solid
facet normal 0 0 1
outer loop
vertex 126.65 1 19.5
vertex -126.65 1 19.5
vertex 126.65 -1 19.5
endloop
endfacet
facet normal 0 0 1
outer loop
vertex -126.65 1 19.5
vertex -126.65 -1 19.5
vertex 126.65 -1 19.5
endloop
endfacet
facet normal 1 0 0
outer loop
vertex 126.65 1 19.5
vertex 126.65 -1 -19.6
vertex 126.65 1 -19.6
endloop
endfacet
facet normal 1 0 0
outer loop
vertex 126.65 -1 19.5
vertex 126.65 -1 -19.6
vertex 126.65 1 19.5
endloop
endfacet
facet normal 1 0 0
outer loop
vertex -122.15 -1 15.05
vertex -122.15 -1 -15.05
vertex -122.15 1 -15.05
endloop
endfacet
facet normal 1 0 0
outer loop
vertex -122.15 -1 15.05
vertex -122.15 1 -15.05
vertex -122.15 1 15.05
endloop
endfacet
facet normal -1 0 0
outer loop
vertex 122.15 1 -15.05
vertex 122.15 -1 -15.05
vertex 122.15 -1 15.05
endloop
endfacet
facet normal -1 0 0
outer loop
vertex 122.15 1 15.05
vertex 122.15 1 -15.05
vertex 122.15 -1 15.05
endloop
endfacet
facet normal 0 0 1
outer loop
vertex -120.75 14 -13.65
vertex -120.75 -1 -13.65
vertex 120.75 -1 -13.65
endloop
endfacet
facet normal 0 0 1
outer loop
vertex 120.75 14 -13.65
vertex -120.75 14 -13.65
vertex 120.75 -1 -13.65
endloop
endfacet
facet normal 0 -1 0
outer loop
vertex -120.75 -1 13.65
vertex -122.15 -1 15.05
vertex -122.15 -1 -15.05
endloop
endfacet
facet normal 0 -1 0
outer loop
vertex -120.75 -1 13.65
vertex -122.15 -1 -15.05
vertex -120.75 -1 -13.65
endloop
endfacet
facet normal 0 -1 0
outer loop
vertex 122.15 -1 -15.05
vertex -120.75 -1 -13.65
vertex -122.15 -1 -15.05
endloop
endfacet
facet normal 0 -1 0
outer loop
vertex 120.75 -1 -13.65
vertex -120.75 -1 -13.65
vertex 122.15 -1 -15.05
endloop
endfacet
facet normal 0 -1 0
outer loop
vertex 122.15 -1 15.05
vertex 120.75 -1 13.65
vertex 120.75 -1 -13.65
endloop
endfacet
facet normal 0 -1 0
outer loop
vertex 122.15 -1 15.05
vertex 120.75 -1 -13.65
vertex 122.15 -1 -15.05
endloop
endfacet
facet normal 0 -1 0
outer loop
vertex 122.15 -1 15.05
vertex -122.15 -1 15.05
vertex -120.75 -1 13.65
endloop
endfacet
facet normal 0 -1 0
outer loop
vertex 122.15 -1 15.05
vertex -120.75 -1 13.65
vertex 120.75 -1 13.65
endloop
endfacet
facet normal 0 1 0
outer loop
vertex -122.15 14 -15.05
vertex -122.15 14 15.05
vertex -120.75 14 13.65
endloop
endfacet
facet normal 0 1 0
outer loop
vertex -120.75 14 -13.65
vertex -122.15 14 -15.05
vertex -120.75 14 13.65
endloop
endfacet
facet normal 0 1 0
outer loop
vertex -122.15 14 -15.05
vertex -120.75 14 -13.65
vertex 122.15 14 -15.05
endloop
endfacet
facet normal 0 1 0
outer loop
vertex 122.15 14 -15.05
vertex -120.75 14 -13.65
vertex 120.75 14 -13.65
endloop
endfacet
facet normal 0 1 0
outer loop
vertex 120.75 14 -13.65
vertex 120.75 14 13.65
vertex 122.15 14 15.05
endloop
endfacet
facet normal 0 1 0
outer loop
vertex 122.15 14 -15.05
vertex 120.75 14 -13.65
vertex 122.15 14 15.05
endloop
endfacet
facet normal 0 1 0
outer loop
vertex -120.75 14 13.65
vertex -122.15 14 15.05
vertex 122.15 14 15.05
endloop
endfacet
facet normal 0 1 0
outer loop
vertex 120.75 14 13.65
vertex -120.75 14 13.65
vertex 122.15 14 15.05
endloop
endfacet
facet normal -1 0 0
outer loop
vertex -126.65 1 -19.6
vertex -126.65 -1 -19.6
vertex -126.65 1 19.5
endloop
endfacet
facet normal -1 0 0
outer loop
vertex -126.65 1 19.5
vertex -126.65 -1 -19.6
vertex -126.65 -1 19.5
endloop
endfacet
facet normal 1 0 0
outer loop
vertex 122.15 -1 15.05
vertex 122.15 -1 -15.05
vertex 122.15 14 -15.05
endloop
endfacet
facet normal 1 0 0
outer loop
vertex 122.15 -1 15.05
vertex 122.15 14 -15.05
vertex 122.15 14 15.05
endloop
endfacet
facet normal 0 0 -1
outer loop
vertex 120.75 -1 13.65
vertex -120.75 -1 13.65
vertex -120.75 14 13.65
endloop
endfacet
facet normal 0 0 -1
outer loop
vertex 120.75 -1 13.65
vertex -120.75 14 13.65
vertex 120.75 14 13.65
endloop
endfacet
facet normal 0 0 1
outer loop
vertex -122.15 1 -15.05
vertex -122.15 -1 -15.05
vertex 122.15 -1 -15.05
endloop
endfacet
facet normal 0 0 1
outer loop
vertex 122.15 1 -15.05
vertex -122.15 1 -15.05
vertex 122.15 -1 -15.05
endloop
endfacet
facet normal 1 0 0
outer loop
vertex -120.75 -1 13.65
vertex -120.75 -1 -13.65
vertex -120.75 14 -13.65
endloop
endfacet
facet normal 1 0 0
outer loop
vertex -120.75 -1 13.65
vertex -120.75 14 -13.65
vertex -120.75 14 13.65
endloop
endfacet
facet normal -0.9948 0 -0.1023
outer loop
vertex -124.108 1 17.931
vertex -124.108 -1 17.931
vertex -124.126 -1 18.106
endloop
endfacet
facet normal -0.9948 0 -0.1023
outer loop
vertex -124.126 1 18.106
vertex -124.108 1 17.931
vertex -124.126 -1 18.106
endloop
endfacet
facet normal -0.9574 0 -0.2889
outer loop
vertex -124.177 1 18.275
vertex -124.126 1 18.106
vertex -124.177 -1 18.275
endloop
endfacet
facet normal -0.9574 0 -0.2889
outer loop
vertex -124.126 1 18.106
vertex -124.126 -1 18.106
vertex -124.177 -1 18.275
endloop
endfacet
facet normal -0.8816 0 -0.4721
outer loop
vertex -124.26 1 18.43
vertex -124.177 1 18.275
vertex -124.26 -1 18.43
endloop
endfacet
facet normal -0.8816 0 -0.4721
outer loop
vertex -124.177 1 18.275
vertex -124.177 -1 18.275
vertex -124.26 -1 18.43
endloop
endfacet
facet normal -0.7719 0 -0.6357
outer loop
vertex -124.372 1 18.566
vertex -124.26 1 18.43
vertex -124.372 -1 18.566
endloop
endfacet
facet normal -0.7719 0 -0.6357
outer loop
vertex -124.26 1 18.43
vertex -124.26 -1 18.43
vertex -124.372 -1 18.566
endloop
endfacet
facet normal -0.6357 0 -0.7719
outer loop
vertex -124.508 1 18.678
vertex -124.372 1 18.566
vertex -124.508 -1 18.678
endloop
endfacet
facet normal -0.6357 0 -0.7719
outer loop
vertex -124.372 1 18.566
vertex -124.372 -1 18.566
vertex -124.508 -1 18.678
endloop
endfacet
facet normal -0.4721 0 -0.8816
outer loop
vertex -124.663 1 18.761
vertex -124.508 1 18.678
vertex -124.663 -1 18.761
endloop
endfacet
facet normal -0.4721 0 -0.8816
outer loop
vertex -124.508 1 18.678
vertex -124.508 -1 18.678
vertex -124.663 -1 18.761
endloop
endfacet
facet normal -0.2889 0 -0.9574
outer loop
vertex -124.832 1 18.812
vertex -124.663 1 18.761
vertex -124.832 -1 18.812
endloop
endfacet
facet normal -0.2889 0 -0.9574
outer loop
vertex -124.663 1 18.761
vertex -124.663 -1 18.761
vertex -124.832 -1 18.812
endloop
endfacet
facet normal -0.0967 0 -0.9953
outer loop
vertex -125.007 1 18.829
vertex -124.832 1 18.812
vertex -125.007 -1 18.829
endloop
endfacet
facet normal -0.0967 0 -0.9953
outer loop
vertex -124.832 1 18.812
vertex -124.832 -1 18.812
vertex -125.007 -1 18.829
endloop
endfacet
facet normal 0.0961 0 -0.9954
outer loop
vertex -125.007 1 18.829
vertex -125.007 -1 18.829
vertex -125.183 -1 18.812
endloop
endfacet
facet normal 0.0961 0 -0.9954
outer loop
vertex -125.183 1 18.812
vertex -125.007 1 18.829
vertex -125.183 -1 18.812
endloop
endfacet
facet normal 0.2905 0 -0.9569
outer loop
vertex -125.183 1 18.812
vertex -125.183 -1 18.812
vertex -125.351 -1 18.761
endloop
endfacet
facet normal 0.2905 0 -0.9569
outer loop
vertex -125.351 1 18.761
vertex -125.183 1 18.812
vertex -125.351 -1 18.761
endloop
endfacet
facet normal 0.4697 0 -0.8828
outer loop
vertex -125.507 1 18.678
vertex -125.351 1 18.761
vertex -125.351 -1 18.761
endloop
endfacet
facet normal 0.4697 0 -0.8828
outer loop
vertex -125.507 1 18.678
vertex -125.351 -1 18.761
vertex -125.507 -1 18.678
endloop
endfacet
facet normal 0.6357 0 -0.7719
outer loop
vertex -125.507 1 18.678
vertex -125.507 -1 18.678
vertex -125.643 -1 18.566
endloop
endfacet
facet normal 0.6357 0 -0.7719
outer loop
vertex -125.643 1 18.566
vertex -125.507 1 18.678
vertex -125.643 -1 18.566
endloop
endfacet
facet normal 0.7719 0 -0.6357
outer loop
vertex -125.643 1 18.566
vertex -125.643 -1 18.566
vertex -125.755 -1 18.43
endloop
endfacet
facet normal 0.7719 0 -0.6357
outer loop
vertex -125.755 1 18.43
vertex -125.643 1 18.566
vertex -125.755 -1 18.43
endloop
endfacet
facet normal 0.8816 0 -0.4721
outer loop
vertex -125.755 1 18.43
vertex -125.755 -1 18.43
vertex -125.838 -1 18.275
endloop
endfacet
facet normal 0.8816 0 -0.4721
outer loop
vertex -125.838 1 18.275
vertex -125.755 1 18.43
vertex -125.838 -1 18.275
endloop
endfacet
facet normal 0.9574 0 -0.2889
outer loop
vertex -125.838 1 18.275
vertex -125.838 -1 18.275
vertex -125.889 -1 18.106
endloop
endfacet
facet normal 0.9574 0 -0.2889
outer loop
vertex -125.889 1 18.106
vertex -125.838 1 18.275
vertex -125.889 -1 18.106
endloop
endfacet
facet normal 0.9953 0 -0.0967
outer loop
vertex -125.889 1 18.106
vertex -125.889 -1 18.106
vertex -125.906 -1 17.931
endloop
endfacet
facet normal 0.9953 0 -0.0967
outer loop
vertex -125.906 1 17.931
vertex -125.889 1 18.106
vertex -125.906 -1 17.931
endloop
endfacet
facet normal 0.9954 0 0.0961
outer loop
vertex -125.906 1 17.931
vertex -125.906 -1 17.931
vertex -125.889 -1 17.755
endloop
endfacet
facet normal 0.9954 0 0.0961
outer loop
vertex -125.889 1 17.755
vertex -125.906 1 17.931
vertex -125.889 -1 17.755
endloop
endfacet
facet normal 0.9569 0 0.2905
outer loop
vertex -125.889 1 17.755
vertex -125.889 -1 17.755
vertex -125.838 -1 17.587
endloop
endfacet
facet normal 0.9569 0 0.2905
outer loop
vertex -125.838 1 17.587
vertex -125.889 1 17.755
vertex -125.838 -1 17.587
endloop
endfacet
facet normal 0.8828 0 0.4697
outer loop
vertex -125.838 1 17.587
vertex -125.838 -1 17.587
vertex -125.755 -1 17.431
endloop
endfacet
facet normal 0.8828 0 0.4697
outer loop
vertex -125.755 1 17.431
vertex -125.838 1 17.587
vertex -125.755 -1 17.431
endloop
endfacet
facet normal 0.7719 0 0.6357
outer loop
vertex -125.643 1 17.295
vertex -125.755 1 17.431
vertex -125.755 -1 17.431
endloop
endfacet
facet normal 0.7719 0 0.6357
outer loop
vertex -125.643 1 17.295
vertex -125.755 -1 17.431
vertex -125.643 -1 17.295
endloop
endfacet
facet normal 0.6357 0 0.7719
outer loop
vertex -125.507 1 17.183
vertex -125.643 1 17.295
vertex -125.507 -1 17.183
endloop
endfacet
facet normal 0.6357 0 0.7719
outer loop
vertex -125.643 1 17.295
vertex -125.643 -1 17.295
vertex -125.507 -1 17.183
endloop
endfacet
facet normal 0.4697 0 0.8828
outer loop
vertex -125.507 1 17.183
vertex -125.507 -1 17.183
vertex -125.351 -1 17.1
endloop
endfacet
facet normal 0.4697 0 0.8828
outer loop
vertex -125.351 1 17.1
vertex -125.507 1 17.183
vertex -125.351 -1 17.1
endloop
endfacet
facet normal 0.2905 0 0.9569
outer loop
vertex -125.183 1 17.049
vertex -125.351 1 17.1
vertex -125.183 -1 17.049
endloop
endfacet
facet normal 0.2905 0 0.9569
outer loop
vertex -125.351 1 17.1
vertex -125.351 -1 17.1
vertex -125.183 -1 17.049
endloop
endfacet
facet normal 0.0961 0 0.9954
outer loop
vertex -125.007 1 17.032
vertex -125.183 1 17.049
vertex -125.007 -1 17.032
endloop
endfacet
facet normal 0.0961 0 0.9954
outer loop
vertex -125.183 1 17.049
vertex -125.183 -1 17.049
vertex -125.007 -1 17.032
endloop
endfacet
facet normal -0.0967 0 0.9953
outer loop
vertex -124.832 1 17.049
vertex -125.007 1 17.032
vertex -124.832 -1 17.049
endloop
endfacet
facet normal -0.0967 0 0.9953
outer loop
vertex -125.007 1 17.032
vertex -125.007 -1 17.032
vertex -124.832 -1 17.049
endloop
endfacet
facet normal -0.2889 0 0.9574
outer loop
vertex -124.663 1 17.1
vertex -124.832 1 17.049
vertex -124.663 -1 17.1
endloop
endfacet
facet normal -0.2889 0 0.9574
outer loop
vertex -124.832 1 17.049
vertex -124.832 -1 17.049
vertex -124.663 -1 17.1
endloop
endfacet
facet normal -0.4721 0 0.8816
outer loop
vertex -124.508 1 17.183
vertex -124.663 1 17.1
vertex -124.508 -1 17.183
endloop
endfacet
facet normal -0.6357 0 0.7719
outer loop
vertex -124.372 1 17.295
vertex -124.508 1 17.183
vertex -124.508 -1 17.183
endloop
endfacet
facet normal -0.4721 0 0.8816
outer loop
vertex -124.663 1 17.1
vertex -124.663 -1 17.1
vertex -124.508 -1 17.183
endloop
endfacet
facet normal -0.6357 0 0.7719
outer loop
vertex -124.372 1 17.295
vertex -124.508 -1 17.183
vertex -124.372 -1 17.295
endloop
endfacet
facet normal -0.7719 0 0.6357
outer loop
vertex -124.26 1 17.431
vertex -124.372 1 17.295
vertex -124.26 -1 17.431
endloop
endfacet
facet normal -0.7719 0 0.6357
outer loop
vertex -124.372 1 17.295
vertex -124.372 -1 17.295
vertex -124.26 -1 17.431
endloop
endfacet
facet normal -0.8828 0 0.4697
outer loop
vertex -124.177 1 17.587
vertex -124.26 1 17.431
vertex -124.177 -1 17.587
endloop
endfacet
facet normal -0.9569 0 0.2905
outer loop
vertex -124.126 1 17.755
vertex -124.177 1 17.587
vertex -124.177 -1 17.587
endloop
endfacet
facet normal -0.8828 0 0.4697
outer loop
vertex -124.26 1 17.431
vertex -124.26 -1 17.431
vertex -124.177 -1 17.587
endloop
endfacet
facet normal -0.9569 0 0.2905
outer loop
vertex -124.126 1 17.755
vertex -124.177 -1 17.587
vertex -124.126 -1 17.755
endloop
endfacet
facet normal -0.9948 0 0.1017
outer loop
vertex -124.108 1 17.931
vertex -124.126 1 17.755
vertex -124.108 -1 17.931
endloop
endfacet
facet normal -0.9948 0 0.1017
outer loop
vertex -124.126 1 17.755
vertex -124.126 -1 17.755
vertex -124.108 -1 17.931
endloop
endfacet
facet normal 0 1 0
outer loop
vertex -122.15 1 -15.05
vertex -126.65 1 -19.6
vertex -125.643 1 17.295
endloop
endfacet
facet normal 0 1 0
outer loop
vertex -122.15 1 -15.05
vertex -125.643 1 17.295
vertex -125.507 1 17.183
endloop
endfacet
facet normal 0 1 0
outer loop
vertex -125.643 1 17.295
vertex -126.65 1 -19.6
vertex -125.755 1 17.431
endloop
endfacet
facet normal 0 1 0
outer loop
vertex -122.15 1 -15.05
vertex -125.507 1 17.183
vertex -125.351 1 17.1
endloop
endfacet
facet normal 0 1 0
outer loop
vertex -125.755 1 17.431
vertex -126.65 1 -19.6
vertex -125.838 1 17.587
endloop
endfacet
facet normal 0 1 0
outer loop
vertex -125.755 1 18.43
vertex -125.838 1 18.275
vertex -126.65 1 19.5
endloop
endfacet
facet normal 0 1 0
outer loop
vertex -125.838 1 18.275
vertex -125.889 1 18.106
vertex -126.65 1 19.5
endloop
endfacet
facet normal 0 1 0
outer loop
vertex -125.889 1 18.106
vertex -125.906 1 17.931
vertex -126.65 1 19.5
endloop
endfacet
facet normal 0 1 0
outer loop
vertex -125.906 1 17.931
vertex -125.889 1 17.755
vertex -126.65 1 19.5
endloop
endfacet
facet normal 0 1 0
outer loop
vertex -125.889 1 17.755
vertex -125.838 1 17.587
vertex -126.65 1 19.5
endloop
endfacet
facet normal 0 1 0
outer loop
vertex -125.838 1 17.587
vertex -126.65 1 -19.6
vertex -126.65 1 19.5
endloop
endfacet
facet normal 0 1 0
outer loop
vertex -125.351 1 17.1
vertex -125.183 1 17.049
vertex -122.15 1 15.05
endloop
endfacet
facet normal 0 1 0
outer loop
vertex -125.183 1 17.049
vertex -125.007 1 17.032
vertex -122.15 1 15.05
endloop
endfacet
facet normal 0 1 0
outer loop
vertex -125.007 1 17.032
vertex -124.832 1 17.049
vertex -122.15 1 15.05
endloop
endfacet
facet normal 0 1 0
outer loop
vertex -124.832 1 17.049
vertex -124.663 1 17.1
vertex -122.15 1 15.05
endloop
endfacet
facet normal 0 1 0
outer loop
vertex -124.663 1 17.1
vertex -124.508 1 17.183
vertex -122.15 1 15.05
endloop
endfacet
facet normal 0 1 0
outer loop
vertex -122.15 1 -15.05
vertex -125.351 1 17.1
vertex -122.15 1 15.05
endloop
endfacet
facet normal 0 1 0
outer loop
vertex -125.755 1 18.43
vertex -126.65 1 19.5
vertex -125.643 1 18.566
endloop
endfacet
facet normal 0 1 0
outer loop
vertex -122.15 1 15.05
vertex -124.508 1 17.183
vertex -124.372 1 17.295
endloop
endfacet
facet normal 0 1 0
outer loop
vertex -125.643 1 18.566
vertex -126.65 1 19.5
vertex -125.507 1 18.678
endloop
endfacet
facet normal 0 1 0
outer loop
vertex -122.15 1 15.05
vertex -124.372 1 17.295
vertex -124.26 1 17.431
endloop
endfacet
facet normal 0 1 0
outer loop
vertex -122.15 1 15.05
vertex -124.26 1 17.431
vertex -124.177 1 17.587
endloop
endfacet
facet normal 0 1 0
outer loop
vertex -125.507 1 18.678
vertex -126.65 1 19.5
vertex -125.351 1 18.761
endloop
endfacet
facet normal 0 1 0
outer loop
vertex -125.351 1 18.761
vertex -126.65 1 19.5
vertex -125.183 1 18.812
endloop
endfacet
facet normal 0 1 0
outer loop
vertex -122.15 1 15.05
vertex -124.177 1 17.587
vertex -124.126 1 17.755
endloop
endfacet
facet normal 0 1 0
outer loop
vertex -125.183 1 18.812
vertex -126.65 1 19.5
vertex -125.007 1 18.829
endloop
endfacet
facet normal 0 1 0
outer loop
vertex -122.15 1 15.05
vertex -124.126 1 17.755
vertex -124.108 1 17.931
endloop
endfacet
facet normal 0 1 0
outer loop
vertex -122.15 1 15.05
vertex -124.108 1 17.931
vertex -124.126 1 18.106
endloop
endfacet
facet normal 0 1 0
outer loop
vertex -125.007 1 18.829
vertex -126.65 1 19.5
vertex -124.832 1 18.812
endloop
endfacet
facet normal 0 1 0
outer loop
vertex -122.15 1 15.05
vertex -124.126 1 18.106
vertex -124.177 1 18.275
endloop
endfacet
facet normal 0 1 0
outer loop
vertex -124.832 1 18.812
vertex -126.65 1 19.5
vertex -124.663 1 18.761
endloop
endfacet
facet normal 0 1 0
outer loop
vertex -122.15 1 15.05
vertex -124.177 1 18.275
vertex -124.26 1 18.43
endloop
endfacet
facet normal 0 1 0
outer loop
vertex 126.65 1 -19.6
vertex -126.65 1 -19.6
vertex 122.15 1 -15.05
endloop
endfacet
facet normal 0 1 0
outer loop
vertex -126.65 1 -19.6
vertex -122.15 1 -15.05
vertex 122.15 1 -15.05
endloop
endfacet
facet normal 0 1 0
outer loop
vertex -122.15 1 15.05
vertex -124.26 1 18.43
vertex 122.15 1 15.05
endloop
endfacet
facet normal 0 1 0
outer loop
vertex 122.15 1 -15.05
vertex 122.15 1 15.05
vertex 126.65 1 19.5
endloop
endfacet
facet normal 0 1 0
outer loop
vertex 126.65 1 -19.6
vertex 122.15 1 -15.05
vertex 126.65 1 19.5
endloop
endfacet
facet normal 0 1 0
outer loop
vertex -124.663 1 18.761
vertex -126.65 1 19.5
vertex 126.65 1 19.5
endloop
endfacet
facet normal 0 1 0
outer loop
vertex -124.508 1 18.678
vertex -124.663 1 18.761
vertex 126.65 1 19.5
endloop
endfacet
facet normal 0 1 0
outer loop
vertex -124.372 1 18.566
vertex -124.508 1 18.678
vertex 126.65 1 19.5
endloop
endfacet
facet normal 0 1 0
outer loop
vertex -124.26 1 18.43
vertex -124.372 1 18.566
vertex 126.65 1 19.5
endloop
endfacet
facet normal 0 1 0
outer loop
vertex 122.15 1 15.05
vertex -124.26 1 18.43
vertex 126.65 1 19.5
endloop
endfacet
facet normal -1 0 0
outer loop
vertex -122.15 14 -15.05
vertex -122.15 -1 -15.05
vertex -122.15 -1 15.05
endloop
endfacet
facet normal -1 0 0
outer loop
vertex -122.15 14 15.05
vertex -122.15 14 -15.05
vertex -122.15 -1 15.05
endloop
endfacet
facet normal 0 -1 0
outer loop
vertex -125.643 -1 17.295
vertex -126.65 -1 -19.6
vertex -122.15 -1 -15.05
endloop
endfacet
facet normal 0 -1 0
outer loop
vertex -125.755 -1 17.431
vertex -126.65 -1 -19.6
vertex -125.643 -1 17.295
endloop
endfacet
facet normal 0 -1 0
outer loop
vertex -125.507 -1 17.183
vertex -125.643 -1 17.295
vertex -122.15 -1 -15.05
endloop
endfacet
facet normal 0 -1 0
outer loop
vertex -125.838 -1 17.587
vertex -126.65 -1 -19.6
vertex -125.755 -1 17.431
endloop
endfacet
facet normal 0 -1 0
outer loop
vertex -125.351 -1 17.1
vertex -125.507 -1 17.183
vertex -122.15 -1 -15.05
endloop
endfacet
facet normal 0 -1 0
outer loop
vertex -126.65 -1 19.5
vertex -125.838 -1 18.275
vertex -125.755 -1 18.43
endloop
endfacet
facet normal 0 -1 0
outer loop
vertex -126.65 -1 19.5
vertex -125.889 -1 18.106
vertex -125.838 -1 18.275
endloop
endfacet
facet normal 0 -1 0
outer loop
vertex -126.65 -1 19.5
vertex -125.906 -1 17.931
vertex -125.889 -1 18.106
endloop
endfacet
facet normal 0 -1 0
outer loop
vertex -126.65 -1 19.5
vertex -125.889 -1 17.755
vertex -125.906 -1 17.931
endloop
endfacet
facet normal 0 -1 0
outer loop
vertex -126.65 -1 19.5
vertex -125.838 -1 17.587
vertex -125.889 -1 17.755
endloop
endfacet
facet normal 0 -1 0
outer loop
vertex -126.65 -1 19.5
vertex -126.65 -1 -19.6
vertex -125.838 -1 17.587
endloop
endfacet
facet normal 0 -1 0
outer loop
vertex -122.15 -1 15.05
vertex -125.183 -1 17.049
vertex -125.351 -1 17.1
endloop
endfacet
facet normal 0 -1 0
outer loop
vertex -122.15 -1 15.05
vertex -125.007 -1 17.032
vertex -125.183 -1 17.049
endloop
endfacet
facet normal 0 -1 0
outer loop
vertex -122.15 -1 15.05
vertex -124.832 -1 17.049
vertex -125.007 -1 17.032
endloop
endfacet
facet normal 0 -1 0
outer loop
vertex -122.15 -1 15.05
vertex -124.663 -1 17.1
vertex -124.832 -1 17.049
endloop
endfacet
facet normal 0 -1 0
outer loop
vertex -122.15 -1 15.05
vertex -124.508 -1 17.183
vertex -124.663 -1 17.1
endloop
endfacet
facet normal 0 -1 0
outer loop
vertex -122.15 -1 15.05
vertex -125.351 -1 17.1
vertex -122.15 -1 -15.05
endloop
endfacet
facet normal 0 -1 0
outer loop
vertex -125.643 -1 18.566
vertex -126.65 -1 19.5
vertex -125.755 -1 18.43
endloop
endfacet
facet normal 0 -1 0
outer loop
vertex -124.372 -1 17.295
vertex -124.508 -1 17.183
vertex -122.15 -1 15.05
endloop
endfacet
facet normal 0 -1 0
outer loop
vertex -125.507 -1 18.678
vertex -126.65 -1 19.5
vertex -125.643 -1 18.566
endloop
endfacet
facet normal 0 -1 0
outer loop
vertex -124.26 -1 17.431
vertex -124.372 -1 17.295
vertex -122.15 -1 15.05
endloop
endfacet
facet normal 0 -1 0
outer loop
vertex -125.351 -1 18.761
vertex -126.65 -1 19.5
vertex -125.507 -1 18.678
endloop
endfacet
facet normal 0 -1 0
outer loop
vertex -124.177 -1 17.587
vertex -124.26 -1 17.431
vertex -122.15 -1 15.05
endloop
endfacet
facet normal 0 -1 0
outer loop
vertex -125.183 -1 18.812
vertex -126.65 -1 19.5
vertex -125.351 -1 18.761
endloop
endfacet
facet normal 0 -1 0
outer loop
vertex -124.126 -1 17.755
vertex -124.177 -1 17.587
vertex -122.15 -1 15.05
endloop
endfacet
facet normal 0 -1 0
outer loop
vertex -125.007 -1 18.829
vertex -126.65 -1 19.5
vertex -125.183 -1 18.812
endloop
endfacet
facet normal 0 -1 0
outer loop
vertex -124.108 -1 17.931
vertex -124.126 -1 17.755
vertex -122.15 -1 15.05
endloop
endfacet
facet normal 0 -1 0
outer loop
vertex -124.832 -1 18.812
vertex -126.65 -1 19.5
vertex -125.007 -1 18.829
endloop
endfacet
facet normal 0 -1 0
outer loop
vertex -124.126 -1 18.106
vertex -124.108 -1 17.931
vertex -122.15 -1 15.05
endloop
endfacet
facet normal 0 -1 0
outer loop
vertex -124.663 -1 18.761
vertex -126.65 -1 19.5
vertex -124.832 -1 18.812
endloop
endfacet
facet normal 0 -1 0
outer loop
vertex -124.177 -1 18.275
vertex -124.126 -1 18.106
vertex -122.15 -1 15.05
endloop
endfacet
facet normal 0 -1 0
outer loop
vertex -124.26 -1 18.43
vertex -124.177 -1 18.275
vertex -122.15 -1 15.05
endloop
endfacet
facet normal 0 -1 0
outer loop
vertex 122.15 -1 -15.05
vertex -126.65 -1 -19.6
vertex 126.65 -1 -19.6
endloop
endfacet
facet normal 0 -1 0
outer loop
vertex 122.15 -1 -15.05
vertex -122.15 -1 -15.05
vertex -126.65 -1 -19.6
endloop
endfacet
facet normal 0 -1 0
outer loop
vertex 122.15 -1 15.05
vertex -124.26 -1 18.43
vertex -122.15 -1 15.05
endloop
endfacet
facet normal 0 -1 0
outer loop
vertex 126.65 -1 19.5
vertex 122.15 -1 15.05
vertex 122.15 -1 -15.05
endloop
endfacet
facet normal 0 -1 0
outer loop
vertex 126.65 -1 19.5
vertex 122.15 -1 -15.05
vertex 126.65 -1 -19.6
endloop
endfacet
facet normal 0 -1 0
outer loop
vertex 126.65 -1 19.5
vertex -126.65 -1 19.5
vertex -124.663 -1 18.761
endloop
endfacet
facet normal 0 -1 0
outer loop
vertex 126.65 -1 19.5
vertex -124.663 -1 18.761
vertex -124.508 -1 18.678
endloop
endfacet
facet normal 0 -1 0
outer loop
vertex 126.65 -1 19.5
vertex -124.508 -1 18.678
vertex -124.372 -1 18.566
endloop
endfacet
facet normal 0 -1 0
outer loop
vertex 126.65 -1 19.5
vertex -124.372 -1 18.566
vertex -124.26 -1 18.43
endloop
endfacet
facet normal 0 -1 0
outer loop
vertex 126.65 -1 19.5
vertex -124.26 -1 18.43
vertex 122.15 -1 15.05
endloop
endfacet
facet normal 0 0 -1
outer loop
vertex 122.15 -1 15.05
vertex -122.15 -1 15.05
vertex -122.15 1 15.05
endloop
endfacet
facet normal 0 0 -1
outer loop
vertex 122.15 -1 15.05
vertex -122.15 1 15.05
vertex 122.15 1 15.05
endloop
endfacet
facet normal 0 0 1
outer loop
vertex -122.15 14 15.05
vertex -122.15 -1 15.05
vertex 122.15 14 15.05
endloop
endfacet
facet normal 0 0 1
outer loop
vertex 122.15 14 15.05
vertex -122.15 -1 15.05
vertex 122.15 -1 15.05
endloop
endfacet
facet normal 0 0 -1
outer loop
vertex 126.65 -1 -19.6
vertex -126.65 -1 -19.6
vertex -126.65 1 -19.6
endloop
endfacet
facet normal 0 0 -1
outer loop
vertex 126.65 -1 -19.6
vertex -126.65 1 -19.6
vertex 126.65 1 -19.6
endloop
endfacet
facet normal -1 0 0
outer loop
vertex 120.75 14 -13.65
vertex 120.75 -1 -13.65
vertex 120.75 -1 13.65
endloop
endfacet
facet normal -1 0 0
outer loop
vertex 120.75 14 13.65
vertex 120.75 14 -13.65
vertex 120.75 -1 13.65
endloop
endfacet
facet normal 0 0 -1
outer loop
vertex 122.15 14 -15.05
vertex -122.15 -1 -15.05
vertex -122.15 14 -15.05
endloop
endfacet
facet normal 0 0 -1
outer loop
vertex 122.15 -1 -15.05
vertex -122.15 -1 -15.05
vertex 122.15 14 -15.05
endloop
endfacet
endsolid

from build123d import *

# Parameters (mm, degrees)
F0_W     = 253.3
F0_H     = 39.1
F1_DEPTH = 1
F2_W     = 244.3
F2_H     = 30.1
F3_DEPTH = 2.001
F4_W     = 244.3
F4_H     = 30.1
F4_W_2   = 241.5
F4_H_2   = 27.3
F5_DEPTH = 15
F8_R     = 0.89897
F9_DEPTH = 50


with BuildPart() as f1:
    # F0 (on Front) → F1 (new body, symmetric)
    with BuildSketch(Plane.XZ):
        with Locations((0, -0.05)):
            Rectangle(F0_W, F0_H)
    extrude(amount=F1_DEPTH, both=True)

    # F2 (on face) → F3 (cut, through all)
    with BuildSketch(Plane.XZ.offset(1)):
        Rectangle(F2_W, F2_H)
    extrude(amount=-F3_DEPTH, mode=Mode.SUBTRACT)

    # F8 (on face) → F9 (cut)
    with BuildSketch(Plane.XZ.offset(1)):
        with Locations((-125.007227, 17.930528)):
            Circle(F8_R)
    extrude(amount=-F9_DEPTH, mode=Mode.SUBTRACT)


with BuildPart() as f5:
    # F4 (on face) → F5 (new body)
    with BuildSketch(Plane.XZ.offset(1)):
        Rectangle(F4_W, F4_H)
        Rectangle(F4_W_2, F4_H_2, mode=Mode.SUBTRACT)
    extrude(amount=-F5_DEPTH)


solid = Compound([f1.part, f5.part])
